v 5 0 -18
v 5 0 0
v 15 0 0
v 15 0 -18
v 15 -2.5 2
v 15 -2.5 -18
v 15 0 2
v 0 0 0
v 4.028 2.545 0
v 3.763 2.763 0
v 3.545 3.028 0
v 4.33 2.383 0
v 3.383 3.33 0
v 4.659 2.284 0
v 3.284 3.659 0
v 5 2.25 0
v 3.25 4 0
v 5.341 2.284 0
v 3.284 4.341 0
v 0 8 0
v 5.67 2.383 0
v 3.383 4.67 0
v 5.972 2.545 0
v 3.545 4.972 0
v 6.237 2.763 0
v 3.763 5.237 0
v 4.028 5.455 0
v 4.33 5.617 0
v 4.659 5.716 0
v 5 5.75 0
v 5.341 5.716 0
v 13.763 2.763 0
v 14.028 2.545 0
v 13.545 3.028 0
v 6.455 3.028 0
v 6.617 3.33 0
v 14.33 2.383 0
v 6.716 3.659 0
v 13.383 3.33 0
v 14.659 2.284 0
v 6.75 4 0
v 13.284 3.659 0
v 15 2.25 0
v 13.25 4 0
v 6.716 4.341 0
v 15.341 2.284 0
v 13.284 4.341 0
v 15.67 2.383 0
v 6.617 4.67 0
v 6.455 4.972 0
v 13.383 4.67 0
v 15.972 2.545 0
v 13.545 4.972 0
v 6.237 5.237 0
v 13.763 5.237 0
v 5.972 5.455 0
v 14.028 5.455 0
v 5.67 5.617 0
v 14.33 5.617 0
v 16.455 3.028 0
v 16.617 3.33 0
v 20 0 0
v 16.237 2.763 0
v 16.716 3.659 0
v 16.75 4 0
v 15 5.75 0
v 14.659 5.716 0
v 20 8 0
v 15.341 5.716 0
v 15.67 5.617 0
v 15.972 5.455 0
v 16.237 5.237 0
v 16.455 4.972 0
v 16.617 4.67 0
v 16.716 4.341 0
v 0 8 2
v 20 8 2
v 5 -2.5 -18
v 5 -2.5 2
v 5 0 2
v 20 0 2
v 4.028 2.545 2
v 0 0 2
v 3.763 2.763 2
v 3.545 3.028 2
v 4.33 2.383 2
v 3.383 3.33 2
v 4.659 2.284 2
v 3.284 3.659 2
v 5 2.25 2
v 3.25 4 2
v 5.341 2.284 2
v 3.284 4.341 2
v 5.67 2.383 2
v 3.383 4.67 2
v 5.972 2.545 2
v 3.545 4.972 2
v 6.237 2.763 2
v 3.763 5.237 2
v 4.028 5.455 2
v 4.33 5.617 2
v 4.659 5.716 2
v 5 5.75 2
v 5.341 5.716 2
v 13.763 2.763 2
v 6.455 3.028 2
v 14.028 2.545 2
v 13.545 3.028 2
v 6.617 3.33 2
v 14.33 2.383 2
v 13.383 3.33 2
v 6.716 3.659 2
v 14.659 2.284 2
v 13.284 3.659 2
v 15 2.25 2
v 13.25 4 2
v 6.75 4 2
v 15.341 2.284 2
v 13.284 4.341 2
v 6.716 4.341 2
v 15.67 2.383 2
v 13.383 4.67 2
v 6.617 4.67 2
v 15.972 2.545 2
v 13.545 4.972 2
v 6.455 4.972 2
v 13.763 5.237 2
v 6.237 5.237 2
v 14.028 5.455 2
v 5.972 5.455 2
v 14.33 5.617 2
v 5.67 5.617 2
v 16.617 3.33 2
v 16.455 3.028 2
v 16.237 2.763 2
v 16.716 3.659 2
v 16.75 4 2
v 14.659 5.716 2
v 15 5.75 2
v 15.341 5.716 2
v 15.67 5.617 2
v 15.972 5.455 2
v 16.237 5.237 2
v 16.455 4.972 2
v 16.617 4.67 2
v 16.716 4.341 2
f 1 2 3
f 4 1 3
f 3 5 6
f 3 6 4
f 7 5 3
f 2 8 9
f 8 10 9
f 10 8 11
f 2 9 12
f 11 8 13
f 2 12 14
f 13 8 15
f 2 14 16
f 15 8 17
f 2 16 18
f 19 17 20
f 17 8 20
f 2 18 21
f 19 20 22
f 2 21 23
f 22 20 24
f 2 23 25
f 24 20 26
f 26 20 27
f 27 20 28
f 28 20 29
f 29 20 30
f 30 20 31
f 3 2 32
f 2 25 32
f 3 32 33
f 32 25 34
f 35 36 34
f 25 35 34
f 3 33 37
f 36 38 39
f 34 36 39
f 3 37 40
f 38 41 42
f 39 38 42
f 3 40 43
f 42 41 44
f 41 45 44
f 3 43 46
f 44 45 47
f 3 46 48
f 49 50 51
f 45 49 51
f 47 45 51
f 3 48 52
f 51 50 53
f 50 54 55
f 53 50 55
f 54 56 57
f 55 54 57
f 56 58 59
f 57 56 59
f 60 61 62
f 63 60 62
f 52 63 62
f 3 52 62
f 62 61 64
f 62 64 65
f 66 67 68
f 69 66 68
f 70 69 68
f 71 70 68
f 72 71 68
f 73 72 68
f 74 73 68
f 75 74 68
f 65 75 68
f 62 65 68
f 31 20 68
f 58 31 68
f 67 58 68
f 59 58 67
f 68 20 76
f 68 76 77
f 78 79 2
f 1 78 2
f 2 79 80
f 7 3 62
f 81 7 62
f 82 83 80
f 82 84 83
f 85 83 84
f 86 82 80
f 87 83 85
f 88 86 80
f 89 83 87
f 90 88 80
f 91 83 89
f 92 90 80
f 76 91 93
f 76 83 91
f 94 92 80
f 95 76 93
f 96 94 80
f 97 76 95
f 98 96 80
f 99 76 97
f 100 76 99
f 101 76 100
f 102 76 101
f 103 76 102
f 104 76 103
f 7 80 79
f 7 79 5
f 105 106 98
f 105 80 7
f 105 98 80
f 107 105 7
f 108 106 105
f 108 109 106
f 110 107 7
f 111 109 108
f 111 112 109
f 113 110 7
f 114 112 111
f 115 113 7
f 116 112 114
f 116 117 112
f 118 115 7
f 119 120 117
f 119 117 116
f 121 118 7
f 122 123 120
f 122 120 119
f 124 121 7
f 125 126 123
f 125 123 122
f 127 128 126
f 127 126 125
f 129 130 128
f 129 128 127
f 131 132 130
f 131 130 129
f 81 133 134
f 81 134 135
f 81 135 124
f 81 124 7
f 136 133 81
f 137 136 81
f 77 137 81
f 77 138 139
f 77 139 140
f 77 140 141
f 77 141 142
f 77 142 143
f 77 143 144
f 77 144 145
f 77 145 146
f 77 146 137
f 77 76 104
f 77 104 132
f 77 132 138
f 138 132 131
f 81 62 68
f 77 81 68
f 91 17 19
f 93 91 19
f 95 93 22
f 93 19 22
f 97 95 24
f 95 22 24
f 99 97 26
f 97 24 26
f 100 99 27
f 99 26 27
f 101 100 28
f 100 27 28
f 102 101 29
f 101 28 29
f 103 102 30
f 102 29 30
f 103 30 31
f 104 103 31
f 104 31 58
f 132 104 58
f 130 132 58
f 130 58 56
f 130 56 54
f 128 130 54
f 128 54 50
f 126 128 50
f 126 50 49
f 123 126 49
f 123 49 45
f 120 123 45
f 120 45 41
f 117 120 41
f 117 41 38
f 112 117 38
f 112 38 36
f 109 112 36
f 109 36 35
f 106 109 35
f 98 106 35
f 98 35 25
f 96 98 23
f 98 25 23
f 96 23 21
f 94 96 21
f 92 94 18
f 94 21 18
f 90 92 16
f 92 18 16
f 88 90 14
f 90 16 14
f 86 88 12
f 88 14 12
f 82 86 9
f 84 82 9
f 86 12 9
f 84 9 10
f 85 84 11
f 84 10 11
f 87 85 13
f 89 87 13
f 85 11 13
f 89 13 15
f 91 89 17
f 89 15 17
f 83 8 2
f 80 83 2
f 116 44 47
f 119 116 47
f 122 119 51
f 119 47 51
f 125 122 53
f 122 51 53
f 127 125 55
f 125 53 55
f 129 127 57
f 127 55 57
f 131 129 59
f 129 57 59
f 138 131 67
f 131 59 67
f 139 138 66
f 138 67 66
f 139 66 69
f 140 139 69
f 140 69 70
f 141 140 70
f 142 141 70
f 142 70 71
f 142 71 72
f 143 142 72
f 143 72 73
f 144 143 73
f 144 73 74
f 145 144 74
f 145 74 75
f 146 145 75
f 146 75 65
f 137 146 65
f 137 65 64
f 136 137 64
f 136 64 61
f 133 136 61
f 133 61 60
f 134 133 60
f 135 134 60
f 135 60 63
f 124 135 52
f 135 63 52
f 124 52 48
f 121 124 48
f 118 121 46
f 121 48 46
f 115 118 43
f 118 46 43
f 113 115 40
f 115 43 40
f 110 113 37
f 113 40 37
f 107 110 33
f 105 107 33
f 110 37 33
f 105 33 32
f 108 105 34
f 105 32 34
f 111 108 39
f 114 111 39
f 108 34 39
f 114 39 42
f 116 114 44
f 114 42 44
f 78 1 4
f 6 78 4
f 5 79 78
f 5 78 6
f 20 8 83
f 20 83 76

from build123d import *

# Parameters (mm, degrees)
SKETCH_1_W          = 20
SKETCH_1_H          = 8
EXTRUDE_1_DEPTH     = 2
SKETCH_2_W          = 10
SKETCH_2_H          = 2.5
EXTRUDE_2_DEPTH     = 20
SKETCH_3_R          = 1.75
CUT_EXTRUDE_1_DEPTH = 20


with BuildPart() as part:
    # 草图1 → 凸台-拉伸1 (new body)
    with BuildSketch(Plane.XY):
        with Locations((10, 4)):
            Rectangle(SKETCH_1_W, SKETCH_1_H)
    extrude(amount=EXTRUDE_1_DEPTH)

    # 草图2 → 凸台-拉伸2 (add)
    with BuildSketch(Plane.XY.offset(2)):
        with Locations((10, -1.25)):
            Rectangle(SKETCH_2_W, SKETCH_2_H)
    extrude(amount=-EXTRUDE_2_DEPTH)

    # 草图3 → 切除-拉伸1 (cut)
    with BuildSketch(Plane(origin=(0, 0, 0), x_dir=(-1, 0, 0), z_dir=(0, 0, -1))):
        with Locations((-15, 4)):
            Circle(SKETCH_3_R)
        with Locations((-5, 4)):
            Circle(SKETCH_3_R)
    extrude(amount=-CUT_EXTRUDE_1_DEPTH, mode=Mode.SUBTRACT)


solid = part.part
